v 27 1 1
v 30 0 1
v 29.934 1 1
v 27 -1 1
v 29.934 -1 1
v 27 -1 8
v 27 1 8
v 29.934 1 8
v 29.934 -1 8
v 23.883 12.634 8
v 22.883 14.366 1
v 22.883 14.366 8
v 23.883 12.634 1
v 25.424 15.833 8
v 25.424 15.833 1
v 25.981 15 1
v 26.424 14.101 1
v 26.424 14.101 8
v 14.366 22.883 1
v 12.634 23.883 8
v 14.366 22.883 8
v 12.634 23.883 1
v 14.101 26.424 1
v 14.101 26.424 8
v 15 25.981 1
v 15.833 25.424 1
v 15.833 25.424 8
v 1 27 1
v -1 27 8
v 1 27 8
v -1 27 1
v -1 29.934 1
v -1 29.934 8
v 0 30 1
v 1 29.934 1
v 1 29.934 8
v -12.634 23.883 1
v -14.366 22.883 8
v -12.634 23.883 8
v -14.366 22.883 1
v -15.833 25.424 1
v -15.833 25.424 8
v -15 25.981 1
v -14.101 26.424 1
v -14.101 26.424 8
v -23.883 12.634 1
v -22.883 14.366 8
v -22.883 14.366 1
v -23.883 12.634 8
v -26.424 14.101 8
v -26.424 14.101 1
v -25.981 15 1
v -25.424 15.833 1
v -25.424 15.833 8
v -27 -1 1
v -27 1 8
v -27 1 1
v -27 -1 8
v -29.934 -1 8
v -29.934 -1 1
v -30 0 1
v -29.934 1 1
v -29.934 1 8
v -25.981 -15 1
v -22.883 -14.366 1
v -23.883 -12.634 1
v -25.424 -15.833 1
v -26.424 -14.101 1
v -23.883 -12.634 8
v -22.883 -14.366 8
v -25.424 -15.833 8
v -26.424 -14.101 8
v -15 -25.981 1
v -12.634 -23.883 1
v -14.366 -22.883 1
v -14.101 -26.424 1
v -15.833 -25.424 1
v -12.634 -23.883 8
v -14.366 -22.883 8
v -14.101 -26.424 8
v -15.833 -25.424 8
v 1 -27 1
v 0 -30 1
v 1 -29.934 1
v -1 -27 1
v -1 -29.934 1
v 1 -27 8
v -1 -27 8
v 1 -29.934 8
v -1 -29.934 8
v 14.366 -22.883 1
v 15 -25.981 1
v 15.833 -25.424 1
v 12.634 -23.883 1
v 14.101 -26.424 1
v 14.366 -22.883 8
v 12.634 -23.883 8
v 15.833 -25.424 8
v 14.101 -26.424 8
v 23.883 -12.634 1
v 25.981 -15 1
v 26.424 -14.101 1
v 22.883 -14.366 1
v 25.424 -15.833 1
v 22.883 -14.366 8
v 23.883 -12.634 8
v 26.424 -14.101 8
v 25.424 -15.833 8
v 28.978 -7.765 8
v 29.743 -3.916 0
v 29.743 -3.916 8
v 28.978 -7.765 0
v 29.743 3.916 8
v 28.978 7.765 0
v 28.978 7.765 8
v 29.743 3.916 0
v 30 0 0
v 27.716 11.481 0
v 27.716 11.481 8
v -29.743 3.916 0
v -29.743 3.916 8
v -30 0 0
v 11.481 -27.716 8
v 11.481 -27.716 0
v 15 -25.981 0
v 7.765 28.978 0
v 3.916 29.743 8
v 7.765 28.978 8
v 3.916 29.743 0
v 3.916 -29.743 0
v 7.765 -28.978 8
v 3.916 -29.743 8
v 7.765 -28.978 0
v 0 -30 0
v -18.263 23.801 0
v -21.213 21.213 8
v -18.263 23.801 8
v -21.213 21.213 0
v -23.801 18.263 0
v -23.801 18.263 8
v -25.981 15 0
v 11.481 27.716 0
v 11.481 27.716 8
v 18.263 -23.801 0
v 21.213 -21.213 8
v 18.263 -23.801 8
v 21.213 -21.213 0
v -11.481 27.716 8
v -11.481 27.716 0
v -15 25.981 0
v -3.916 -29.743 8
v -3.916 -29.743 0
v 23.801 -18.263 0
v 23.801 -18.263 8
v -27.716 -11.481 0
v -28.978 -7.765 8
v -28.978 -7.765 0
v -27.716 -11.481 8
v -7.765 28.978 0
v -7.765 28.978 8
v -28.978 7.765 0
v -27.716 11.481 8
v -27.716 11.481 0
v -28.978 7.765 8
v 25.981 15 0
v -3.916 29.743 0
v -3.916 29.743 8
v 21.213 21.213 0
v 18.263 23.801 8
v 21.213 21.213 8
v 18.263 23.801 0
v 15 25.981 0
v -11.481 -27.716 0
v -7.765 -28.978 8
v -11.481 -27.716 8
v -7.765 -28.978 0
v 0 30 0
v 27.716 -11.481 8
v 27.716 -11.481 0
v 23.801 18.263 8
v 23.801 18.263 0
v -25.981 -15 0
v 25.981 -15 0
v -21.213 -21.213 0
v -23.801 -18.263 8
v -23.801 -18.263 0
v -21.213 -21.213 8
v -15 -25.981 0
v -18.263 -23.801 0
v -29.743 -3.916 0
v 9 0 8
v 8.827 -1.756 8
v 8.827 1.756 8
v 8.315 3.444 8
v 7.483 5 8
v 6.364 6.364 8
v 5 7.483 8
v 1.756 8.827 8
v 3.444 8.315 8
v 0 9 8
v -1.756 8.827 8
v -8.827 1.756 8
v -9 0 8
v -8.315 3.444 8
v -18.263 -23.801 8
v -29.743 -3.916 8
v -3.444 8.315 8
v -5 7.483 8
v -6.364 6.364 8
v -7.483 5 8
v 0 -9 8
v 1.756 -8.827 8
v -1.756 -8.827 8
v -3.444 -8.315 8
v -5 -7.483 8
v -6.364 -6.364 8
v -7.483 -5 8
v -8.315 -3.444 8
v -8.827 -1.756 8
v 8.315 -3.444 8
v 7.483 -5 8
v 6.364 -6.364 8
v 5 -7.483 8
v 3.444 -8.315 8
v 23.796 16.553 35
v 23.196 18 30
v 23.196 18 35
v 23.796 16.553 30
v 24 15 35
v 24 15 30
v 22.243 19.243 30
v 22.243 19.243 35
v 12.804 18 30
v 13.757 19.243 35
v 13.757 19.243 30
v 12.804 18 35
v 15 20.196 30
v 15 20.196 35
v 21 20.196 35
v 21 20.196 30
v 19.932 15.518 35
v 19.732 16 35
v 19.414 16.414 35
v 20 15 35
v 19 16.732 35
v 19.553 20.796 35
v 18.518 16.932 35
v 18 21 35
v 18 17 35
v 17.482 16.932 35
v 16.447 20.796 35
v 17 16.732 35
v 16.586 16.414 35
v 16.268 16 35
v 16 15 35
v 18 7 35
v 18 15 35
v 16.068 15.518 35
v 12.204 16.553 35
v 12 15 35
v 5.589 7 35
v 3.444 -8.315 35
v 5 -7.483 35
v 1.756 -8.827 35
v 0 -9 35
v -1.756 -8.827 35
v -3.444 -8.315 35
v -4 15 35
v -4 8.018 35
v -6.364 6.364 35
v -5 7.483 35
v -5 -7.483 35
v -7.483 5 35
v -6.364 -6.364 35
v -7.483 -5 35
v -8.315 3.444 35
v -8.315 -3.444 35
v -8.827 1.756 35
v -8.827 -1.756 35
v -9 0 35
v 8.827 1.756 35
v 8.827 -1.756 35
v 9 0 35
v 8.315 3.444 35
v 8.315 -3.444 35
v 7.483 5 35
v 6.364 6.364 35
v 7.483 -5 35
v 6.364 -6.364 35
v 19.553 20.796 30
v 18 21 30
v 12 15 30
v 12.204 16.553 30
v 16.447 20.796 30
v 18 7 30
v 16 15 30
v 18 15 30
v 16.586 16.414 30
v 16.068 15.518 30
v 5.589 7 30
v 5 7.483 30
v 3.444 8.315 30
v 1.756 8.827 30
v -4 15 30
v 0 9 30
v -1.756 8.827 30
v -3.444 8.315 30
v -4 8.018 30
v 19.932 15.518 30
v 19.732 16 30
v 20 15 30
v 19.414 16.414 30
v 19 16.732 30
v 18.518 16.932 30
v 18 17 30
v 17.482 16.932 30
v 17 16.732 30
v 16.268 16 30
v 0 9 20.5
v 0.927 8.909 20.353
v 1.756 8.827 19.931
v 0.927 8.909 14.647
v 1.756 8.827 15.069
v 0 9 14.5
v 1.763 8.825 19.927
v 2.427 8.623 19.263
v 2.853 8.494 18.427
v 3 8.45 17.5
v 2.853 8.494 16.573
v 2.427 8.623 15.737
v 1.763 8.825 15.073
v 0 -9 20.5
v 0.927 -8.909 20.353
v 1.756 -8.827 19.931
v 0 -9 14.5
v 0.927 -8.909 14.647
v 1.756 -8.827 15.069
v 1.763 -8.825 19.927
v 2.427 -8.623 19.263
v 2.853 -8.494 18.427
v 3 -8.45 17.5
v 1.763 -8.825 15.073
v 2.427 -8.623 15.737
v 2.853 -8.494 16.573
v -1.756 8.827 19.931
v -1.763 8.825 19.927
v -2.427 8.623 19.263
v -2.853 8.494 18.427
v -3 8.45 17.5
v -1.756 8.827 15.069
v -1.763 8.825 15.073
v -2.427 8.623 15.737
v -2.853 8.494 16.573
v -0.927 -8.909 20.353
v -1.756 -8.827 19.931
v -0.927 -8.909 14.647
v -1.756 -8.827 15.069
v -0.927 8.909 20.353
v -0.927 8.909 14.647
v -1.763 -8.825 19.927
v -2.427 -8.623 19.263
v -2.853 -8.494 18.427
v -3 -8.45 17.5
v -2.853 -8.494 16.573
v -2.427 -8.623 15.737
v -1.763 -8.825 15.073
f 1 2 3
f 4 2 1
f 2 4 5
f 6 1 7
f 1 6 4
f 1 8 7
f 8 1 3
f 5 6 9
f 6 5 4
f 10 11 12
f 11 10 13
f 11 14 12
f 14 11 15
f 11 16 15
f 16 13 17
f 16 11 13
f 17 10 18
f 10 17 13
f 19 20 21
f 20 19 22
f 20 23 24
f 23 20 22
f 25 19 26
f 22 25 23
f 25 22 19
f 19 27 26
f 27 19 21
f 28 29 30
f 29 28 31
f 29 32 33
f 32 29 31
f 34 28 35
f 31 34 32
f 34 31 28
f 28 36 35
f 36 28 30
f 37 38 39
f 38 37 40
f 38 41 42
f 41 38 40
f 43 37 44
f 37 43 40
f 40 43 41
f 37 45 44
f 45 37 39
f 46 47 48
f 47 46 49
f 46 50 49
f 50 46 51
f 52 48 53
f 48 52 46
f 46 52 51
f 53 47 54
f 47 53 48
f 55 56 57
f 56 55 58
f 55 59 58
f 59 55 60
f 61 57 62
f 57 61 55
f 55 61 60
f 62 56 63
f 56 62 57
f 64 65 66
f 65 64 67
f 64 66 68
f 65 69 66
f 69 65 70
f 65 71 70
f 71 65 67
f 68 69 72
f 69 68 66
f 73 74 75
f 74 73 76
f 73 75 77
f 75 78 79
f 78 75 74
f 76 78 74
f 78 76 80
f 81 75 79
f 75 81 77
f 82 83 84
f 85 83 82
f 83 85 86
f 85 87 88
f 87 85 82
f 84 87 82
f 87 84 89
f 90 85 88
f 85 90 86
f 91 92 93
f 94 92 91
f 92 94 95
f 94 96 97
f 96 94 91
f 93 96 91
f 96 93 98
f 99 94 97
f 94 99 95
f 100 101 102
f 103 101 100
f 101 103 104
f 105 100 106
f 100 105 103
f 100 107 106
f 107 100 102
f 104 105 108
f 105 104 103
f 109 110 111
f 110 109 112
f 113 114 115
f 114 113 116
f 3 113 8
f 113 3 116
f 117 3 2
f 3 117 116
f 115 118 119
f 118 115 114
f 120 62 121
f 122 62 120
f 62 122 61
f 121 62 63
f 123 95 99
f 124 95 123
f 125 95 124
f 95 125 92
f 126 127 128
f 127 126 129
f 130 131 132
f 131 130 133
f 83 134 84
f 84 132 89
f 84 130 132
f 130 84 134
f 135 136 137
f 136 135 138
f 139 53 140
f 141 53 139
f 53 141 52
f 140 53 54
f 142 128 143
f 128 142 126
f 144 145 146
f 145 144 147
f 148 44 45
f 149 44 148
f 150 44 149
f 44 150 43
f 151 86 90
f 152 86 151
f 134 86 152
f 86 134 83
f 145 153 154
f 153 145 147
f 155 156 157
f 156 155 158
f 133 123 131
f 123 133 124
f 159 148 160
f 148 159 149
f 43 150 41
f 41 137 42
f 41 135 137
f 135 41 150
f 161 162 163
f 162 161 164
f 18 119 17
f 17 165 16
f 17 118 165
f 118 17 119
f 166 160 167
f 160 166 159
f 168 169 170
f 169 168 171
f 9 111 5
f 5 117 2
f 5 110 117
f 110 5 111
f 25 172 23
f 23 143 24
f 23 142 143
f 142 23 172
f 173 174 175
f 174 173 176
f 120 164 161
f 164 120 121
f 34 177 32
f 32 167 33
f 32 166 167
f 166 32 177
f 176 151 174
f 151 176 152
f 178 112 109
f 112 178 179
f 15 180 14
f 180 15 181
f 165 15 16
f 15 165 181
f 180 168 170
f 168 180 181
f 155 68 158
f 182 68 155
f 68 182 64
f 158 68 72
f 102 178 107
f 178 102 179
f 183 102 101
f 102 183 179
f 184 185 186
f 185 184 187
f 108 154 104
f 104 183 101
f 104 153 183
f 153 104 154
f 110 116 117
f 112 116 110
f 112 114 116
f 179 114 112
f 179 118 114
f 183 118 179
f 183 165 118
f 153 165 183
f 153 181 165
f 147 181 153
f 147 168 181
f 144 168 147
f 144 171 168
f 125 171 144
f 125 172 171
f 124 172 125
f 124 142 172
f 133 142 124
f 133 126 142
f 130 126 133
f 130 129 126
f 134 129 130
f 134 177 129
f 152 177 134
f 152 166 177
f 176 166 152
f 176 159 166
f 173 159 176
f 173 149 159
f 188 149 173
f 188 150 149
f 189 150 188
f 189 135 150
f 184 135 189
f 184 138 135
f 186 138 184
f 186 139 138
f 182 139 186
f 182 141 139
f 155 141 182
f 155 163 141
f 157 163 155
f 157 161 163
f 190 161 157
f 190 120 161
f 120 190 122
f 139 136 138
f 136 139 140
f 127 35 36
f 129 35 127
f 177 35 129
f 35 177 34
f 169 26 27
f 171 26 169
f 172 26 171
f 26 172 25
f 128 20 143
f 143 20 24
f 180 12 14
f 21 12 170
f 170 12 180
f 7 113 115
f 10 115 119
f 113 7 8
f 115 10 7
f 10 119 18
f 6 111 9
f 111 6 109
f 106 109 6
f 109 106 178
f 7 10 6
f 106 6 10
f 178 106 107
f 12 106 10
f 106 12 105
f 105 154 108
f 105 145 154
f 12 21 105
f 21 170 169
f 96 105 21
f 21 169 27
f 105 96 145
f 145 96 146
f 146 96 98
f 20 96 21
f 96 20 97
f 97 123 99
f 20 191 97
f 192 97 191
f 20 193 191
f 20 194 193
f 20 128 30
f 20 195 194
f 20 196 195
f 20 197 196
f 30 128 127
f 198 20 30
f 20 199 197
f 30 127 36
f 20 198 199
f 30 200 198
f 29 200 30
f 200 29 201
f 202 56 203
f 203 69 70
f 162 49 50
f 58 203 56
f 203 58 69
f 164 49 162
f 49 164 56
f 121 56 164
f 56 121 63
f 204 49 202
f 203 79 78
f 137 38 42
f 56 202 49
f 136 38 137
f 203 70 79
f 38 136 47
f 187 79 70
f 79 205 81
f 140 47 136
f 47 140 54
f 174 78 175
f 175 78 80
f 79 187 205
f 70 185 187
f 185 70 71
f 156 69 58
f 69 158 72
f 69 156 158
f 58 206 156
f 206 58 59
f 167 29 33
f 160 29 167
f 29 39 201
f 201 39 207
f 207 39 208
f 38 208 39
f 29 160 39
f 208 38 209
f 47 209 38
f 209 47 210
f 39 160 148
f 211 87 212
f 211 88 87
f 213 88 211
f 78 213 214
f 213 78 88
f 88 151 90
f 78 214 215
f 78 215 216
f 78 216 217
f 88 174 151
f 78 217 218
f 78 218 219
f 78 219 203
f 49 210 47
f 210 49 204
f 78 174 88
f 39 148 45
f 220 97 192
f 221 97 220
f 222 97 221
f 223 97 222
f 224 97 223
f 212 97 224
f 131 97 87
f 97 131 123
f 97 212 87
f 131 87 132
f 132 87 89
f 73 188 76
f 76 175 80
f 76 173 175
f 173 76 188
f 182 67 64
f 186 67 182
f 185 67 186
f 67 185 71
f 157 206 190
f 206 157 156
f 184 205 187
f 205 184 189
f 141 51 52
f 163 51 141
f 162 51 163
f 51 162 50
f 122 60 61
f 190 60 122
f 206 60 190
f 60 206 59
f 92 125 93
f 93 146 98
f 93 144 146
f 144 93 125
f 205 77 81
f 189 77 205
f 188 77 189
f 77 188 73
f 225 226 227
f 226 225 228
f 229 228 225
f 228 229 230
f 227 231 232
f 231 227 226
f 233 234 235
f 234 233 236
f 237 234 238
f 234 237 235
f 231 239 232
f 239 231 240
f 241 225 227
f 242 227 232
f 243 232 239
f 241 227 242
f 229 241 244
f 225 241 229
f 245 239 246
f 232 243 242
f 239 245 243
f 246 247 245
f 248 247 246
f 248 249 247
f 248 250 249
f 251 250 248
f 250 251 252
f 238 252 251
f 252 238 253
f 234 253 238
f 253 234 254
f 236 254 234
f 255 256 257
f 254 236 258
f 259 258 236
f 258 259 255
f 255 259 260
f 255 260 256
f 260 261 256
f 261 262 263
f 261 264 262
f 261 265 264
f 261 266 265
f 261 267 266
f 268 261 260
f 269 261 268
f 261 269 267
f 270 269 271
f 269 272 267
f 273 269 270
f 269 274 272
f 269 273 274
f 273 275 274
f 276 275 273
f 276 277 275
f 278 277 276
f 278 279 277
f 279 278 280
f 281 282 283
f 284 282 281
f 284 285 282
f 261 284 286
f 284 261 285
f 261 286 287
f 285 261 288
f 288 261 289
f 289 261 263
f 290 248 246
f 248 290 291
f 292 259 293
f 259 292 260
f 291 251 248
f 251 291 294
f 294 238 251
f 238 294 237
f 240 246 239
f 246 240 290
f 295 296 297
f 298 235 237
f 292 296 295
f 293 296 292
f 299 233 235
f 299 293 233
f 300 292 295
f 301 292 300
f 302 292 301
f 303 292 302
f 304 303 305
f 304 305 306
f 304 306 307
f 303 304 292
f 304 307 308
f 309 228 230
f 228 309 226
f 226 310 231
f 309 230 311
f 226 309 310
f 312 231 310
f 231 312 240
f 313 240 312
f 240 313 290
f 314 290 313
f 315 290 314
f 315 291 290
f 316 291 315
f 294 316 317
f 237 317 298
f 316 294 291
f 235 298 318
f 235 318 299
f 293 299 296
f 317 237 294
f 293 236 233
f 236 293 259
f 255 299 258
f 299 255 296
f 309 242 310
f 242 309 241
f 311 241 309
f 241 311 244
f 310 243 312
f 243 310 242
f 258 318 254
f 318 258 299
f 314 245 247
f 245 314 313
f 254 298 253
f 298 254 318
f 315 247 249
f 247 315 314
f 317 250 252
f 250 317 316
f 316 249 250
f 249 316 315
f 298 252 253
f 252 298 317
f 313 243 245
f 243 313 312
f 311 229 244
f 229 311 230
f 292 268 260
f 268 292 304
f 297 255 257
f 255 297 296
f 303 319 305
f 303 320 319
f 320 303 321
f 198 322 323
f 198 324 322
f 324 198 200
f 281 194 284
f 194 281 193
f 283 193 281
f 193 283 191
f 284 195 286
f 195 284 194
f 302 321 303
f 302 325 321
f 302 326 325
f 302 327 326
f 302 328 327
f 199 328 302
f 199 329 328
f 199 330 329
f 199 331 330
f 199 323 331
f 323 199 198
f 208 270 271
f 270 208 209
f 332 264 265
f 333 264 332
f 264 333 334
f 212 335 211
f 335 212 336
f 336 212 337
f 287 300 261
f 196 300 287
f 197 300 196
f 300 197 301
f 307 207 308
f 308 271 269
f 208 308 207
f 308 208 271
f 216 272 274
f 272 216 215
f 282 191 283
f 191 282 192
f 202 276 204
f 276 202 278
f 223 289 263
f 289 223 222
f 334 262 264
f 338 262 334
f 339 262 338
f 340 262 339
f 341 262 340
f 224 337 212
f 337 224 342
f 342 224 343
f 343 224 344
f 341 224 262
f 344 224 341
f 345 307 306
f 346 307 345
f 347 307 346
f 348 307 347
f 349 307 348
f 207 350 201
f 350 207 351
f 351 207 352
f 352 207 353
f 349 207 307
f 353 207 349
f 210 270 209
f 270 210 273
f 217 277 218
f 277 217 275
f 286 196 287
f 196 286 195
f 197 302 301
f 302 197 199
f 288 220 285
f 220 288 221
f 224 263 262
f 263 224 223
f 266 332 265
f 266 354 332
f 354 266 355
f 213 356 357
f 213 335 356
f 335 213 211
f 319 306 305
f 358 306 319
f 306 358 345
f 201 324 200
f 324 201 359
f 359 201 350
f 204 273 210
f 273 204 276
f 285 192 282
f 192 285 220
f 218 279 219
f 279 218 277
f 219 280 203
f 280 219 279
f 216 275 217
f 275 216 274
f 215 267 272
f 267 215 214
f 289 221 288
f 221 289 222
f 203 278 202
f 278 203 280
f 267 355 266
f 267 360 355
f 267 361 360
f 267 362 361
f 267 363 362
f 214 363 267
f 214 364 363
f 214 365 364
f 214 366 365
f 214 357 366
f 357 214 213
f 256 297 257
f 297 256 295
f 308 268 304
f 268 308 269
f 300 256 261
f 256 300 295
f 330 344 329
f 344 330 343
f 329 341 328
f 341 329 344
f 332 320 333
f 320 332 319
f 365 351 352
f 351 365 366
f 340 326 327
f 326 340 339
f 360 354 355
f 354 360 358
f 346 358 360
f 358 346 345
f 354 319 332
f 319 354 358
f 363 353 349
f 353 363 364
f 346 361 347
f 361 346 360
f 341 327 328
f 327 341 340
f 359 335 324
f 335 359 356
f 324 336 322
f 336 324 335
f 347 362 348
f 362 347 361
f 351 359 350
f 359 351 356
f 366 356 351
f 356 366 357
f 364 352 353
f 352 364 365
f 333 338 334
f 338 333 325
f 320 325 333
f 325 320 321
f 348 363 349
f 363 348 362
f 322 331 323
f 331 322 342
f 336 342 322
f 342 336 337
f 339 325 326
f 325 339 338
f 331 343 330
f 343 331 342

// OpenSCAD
// Earphone / AirPods Cable Holder - Desk Organizer
// Popular everyday print, good gift item
// Print: 0.2mm, 3 walls, 15% infill, no supports

BASE_D   = 60;
BASE_H   = 8;
POST_D   = 18;
POST_H   = 35;
ARM_L    = 22;
ARM_W    = 8;
ARM_H    = 5;
HOOK_D   = 12;
CABLE_D  = 6;

module base() {
    difference() {
        cylinder(d = BASE_D, h = BASE_H, $fn = 48);
        // Anti-slip grip grooves
        for (i = [0 : 11])
            rotate([0, 0, i * 30])
                translate([BASE_D/2 - 3, -1, 1])
                    cube([4, 2, BASE_H]);
    }
}

module post() {
    cylinder(d = POST_D, h = POST_H, $fn = 32);
}

module arm() {
    translate([-ARM_W/2, POST_D/2 - 2, POST_H - ARM_H])
        cube([ARM_L, ARM_W, ARM_H]);
}

module earhook() {
    translate([ARM_L - ARM_W/2, POST_D/2 + ARM_W - 2, POST_H - ARM_H])
        difference() {
            cylinder(d = HOOK_D, h = ARM_H, $fn = 24);
            cylinder(d = HOOK_D - ARM_W, h = ARM_H, $fn = 24);
            translate([-HOOK_D/2, -HOOK_D, -1])
                cube([HOOK_D, HOOK_D, ARM_H + 2]);
        }
}

module cable_slot() {
    translate([0, -POST_D/2 - 1, POST_H/2])
        rotate([-90, 0, 0])
            cylinder(d = CABLE_D, h = POST_D + 2, $fn = 20);
}

difference() {
    union() {
        base();
        post();
        arm();
        earhook();
    }
    cable_slot();
}
